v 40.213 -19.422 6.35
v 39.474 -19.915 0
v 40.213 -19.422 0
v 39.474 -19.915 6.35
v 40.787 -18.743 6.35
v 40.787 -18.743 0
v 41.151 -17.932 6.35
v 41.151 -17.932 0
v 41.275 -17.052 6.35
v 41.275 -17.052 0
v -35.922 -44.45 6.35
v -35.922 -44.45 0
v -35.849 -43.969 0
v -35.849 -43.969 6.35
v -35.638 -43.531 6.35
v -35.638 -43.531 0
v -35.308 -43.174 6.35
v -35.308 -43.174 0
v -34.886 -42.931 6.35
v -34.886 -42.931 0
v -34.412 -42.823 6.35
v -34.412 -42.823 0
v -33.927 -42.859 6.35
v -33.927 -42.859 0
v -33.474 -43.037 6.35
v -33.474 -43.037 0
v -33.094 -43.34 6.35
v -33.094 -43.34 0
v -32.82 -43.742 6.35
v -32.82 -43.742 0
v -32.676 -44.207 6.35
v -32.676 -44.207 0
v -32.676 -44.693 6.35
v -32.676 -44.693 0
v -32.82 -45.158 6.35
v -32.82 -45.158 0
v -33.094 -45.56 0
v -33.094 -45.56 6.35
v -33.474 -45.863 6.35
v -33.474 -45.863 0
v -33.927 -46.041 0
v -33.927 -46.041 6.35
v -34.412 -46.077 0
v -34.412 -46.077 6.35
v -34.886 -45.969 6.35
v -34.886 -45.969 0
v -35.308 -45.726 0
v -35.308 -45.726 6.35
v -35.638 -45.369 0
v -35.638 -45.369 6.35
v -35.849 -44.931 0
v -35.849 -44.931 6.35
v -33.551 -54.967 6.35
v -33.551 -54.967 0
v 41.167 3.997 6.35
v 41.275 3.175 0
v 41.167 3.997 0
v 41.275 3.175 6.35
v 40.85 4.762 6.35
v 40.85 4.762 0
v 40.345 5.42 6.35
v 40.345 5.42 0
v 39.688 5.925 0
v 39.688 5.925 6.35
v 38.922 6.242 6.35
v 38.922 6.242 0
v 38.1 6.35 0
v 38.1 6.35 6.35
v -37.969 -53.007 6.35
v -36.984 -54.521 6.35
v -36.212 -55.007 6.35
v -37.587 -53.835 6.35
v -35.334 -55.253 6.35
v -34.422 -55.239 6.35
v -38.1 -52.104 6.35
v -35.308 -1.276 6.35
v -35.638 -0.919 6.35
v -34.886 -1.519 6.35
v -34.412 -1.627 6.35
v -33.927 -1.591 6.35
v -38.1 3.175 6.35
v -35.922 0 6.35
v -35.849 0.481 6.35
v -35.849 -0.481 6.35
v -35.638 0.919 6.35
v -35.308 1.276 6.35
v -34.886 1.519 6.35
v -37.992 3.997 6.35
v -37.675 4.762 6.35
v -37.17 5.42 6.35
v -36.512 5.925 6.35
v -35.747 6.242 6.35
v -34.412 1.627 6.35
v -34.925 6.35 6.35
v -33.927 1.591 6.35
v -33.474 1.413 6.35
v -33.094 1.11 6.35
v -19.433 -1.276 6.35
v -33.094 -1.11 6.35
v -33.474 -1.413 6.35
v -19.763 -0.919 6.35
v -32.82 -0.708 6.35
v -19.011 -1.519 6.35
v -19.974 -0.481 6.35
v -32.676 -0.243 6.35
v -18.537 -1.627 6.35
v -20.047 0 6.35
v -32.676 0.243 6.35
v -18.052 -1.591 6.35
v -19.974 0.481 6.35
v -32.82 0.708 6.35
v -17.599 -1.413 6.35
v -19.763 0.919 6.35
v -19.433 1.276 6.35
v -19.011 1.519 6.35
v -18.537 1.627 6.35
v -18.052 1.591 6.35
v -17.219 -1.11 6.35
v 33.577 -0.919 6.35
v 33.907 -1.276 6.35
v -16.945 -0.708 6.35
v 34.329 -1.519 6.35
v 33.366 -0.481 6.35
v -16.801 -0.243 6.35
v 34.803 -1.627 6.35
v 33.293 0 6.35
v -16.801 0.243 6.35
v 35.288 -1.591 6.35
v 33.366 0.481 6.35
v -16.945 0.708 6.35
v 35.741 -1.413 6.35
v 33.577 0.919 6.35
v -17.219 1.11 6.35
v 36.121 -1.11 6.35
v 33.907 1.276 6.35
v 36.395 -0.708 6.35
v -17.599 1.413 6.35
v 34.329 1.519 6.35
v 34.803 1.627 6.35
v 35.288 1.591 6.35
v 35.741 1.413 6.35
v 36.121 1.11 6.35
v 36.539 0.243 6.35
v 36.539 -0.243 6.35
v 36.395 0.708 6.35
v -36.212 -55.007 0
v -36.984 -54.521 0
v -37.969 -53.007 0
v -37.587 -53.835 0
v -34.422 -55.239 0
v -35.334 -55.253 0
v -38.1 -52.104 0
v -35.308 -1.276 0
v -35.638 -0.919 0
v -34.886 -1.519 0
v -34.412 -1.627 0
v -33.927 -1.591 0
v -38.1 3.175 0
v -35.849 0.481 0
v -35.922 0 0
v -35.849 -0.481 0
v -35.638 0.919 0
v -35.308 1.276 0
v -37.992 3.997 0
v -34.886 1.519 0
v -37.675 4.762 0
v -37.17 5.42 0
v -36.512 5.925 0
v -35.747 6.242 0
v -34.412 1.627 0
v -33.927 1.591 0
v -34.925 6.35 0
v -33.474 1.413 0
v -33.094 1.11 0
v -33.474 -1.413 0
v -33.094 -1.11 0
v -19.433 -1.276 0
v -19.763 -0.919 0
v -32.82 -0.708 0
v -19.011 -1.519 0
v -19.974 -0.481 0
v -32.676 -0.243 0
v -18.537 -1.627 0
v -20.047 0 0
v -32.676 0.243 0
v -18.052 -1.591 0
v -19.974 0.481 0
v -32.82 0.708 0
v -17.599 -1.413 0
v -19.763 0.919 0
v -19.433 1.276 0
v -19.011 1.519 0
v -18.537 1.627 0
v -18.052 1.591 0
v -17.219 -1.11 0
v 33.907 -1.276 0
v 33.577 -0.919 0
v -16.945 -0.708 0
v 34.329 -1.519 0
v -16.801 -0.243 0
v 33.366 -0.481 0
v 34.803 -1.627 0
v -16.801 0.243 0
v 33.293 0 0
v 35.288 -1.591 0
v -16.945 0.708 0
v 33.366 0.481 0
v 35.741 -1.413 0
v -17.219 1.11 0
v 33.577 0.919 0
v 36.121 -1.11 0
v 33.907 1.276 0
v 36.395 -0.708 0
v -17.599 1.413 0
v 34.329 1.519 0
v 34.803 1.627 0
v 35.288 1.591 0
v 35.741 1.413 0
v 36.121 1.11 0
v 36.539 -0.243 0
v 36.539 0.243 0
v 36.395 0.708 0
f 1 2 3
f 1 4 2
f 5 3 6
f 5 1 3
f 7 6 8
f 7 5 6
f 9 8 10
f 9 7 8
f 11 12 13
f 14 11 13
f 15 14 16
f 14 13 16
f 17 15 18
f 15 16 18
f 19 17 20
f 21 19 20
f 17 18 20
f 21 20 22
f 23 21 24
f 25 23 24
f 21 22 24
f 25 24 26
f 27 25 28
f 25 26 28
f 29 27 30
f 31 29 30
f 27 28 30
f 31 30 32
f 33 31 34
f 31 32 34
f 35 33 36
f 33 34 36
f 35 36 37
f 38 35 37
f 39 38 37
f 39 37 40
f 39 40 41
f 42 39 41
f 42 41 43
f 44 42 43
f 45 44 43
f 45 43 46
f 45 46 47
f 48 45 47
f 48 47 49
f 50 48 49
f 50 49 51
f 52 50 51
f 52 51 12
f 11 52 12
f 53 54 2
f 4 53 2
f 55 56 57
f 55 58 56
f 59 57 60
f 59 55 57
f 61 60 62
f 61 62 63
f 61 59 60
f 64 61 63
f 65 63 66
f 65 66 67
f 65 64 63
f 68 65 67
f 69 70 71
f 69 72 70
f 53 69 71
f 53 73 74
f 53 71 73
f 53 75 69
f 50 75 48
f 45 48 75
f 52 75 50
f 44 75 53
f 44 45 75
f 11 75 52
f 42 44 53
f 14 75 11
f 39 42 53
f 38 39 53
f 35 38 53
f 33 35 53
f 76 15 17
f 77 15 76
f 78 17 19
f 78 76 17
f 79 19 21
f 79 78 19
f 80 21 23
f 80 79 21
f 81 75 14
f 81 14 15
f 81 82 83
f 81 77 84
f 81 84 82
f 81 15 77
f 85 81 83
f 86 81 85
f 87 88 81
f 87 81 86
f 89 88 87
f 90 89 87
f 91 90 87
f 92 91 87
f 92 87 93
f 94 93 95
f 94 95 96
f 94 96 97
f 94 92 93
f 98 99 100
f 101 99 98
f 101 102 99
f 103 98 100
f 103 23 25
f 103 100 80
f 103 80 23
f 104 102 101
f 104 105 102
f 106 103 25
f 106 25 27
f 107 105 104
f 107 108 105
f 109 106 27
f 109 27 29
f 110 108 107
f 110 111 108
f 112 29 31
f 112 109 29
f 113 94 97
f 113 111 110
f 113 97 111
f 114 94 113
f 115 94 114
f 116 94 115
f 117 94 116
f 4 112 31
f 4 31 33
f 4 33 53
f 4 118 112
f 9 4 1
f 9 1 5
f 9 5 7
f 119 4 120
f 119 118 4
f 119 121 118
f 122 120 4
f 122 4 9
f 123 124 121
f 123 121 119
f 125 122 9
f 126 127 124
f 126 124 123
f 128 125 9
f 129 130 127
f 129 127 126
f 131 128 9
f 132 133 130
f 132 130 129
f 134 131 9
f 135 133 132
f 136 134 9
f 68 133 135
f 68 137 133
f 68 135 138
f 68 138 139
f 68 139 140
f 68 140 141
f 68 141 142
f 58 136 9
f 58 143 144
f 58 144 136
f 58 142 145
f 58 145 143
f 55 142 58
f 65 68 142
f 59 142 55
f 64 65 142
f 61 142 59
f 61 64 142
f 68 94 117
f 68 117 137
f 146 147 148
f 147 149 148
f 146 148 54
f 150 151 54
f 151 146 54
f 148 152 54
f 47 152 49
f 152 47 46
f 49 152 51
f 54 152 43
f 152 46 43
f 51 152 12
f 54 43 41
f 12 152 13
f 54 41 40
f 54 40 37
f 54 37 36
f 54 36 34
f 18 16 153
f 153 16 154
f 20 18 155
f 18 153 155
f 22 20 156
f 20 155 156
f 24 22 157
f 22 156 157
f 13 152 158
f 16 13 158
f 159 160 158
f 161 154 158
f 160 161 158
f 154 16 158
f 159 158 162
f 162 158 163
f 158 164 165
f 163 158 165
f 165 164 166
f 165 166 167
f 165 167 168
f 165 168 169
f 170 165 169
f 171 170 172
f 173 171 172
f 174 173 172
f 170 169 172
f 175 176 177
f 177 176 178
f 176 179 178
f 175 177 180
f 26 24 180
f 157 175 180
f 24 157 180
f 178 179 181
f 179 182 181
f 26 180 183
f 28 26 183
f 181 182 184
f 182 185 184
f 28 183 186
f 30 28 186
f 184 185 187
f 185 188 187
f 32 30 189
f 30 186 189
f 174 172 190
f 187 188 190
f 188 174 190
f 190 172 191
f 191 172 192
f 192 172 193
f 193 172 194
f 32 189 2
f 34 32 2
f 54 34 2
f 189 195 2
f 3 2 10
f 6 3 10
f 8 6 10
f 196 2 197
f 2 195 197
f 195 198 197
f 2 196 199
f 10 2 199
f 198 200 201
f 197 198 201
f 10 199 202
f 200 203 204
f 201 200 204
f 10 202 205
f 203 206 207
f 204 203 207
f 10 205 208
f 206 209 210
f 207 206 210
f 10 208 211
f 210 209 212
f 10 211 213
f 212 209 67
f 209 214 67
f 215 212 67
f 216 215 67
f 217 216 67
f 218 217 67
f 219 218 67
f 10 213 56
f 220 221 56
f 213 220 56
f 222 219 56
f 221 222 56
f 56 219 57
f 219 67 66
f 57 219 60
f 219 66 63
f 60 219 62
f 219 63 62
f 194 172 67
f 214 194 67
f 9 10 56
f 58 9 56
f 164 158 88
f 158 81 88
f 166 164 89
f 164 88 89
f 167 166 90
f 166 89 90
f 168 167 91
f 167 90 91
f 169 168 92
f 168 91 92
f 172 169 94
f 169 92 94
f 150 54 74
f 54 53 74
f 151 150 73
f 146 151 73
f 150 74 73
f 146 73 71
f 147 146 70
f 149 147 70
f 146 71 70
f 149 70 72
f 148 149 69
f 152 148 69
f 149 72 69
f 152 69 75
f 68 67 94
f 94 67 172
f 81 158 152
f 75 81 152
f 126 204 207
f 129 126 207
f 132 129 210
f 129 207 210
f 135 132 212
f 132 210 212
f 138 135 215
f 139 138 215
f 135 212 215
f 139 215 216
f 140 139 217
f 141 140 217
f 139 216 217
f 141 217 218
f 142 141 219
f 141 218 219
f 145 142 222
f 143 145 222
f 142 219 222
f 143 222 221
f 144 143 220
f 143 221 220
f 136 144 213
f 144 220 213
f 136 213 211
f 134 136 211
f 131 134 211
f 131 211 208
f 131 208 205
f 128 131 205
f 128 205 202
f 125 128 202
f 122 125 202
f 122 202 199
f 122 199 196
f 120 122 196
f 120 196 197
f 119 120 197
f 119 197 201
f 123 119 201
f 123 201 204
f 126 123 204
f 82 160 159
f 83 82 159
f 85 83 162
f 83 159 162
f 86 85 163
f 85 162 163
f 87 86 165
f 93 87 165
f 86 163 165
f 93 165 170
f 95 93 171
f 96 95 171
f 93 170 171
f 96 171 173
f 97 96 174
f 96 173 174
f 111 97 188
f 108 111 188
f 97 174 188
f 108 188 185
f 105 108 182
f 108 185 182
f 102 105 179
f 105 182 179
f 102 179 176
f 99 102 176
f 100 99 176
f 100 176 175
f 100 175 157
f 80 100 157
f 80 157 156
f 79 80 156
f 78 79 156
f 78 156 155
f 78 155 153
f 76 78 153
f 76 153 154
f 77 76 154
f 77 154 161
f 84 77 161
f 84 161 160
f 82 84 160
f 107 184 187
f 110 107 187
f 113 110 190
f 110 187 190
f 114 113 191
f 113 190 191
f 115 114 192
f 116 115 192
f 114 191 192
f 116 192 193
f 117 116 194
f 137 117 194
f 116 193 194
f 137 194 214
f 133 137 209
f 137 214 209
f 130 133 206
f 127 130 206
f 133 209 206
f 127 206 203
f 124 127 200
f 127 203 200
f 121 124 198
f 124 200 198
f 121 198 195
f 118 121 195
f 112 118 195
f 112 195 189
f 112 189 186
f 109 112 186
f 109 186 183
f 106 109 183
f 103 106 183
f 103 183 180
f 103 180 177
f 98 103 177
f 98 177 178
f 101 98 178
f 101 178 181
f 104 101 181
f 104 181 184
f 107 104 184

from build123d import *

# Parameters (mm, degrees)
BOSS_EXTRUDE1_DEPTH       = 6.35
F_4_CLEARANCE_HOLE1_D     = 3.2639
F_4_CLEARANCE_HOLE1_DEPTH = 12.7
F_4_CLEARANCE_HOLE1_TIP   = 0.980574487
FILLET1_R                 = 3.175


with BuildPart() as part:
    # Sketch1 → Boss-Extrude1 (new body)
    with BuildSketch(Plane.XY):
        Polygon((-38.1, -57.15), (41.275, -19.05), (41.275, 6.35), (-38.1, 6.35), align=None)
    extrude(amount=BOSS_EXTRUDE1_DEPTH)

    # #4 Clearance Hole1
    with Locations(Plane.XY.offset(6.35)):
        with Locations((-34.29, 0), (-18.415, 0), (34.925, 0), (-34.29, -44.45)):
            Hole(F_4_CLEARANCE_HOLE1_D / 2, depth=F_4_CLEARANCE_HOLE1_DEPTH)
            with Locations((0, 0, -(F_4_CLEARANCE_HOLE1_DEPTH + F_4_CLEARANCE_HOLE1_TIP / 2))):  # 118° drill point
                Cone(0, F_4_CLEARANCE_HOLE1_D / 2, F_4_CLEARANCE_HOLE1_TIP, mode=Mode.SUBTRACT)

    # Fillet1
    fillet1_edges = [part.edges().sort_by_distance(p)[0] for p in [
        (41.275, -19.05, 3.175),
        (-38.1, -57.15, 3.175),
        (-38.1, 6.35, 3.175),
        (41.275, 6.35, 3.175),
    ]]
    fillet(fillet1_edges, radius=FILLET1_R)


solid = part.part
